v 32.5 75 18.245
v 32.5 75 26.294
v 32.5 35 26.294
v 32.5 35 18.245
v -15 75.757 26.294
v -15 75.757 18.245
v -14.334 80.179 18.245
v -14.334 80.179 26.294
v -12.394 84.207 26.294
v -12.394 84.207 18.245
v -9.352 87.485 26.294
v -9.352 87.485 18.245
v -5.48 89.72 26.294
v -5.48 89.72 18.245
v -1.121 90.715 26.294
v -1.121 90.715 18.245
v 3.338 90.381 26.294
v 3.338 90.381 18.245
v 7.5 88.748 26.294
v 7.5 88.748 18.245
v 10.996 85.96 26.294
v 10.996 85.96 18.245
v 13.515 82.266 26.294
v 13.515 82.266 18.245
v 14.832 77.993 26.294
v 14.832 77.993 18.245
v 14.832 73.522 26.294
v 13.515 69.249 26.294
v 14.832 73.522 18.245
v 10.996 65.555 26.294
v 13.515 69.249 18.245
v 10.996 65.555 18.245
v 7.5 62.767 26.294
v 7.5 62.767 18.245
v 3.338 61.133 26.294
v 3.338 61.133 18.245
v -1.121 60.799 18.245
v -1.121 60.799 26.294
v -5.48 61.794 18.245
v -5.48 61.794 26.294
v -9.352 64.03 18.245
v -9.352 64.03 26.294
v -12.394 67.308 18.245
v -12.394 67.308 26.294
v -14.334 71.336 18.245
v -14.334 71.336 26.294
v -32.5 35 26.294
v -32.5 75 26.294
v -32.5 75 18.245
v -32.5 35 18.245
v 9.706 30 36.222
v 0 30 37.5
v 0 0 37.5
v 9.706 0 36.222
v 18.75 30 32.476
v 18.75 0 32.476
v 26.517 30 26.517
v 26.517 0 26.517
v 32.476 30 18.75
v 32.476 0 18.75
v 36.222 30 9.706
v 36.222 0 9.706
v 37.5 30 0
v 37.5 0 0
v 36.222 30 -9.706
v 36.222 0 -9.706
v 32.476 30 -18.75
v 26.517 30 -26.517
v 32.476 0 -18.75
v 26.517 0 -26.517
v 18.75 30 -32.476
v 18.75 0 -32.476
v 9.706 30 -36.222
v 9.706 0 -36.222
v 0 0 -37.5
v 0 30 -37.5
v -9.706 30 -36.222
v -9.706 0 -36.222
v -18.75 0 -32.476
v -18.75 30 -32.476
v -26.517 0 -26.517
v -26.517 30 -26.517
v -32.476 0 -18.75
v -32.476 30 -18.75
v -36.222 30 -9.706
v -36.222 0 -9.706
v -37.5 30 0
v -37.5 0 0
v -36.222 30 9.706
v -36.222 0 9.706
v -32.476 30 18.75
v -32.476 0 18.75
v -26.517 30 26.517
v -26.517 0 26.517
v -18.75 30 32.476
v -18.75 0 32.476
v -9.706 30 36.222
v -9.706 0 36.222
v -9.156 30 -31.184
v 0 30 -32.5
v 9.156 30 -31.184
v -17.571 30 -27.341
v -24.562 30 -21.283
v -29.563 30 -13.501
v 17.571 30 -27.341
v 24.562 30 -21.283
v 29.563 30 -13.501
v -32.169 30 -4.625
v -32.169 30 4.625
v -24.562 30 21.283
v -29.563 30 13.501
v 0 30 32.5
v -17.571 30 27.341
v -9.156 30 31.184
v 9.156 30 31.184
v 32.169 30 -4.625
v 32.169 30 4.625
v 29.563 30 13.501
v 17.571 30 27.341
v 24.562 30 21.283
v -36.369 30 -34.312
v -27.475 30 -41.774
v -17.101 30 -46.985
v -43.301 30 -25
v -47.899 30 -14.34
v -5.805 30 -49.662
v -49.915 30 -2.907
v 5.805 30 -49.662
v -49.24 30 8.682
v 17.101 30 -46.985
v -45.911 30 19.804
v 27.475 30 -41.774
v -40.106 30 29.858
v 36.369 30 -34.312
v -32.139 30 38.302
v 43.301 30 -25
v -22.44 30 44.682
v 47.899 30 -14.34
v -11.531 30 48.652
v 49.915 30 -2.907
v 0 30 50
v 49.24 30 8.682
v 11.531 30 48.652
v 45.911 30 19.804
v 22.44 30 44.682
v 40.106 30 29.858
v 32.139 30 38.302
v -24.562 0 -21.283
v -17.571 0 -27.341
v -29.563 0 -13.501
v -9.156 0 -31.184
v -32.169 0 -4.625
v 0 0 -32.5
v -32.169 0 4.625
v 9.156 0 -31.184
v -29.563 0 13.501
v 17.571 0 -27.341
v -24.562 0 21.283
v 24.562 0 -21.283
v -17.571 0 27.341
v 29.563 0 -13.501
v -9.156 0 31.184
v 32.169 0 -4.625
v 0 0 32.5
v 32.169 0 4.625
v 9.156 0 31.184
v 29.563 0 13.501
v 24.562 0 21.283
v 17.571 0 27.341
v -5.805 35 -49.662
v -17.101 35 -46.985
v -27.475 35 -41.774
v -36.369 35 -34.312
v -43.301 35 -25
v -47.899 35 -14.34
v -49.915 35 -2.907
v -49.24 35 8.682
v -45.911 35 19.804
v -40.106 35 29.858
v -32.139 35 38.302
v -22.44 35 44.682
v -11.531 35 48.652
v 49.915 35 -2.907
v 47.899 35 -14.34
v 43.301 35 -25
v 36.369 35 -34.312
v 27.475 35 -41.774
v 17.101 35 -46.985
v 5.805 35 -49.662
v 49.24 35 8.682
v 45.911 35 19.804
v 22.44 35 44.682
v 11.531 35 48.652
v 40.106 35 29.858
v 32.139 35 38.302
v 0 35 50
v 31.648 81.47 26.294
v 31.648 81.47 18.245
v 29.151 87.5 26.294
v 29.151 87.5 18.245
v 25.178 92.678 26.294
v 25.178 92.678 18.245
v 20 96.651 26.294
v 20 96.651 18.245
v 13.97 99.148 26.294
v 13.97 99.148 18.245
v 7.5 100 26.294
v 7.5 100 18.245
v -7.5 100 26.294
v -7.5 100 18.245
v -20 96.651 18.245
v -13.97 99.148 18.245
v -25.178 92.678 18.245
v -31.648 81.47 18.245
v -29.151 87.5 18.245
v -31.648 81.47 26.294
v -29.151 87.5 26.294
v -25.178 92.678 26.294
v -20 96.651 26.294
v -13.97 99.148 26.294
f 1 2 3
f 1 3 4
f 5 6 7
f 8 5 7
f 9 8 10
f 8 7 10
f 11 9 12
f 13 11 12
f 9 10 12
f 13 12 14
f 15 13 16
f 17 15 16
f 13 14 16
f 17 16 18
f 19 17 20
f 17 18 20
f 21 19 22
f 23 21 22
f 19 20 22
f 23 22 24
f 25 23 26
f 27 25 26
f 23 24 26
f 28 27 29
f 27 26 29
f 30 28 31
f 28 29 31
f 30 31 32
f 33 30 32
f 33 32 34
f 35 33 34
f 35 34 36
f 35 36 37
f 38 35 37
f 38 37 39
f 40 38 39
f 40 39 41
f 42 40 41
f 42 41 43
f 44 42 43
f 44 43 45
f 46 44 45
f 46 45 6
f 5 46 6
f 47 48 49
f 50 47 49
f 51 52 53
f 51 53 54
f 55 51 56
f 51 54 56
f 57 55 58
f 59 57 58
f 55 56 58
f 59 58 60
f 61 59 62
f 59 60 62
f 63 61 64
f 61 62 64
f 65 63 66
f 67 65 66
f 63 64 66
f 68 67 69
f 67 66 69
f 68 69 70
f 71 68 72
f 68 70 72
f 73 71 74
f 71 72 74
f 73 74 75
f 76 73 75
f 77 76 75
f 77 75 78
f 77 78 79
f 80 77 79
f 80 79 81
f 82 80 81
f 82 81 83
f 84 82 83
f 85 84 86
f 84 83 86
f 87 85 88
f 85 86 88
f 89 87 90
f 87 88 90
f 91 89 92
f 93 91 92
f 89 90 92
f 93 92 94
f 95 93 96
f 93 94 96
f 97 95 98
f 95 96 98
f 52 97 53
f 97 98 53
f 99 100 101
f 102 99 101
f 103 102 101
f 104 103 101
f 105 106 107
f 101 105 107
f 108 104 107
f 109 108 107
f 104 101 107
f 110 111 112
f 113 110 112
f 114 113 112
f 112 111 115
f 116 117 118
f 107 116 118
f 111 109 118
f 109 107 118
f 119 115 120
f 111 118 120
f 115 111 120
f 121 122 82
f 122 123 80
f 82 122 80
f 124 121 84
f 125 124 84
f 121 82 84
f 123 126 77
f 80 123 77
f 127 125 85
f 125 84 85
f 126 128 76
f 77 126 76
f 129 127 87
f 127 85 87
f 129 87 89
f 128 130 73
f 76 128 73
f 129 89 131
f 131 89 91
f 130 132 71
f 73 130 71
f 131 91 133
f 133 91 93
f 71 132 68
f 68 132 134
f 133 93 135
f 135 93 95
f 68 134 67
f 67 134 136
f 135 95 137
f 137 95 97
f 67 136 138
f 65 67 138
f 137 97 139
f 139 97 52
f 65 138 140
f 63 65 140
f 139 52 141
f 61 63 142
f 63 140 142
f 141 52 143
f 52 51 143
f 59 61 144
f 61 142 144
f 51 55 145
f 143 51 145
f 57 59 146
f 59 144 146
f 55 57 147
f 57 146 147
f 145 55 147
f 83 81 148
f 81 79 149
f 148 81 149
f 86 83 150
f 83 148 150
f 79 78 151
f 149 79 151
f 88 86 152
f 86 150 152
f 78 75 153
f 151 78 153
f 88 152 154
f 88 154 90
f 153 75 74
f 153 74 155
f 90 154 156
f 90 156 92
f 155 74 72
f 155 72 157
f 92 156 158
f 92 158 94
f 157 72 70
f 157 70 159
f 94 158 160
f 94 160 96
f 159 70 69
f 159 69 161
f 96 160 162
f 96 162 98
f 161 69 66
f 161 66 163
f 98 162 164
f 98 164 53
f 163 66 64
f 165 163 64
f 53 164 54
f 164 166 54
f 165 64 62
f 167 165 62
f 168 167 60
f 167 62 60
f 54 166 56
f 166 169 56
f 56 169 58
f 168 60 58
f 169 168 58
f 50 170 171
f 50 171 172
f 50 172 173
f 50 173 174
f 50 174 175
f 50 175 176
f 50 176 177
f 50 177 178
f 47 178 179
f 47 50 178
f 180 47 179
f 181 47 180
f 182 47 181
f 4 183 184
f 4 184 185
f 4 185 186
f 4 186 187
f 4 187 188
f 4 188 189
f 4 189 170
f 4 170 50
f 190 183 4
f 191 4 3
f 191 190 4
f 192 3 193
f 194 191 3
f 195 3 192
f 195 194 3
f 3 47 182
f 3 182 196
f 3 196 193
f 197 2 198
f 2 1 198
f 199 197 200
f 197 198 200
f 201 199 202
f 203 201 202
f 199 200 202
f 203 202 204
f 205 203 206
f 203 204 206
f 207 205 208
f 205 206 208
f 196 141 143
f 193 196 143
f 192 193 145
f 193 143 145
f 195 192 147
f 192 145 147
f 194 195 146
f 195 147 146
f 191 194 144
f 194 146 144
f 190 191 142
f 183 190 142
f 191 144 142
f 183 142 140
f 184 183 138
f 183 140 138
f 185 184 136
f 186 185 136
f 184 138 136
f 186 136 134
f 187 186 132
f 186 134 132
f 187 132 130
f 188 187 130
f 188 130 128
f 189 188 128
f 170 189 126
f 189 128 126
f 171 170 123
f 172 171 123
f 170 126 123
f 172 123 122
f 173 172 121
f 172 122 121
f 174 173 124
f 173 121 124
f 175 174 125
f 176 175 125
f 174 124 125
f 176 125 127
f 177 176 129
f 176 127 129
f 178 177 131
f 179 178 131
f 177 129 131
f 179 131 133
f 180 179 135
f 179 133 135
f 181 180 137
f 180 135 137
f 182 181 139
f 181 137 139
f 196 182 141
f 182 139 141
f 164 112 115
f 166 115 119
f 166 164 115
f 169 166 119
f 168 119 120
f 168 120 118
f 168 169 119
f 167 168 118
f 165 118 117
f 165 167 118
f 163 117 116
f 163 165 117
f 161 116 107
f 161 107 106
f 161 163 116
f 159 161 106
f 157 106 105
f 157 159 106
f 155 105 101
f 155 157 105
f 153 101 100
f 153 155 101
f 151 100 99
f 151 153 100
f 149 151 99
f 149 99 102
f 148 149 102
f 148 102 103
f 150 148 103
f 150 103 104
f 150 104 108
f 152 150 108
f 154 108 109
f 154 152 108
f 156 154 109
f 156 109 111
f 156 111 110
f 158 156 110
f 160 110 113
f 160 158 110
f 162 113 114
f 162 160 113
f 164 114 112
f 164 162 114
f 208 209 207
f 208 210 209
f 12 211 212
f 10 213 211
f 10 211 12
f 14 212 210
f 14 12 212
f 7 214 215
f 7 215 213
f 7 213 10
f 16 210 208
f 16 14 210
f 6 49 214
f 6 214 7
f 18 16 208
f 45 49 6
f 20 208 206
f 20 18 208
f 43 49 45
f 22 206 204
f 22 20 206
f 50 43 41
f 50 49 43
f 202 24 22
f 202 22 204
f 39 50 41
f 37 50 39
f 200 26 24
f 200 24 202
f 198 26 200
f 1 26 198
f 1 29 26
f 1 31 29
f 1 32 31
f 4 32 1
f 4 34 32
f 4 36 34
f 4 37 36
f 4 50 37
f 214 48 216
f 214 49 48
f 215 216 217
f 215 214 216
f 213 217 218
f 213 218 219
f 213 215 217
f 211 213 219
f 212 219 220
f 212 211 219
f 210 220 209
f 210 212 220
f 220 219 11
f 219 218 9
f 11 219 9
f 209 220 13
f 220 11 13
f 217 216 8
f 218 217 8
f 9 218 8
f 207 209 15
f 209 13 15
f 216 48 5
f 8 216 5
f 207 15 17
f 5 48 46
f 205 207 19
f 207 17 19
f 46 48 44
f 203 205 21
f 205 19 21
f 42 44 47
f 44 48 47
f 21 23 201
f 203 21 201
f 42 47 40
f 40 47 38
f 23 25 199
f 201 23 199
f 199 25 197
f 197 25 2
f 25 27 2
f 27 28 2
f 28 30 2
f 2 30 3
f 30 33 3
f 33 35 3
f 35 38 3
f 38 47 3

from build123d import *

# Parameters (mm, degrees)
SKETCH3_R           = 37.5
SKETCH3_R_2         = 32.5
BOSS_EXTRUDE1_DEPTH = 30
SKETCH4_R           = 50
BOSS_EXTRUDE2_DEPTH = 5
SKETCH5_W           = 65
SKETCH5_H           = 8.049170271
BOSS_EXTRUDE3_DEPTH = 65
FILLET1_R           = 25
SKETCH6_R           = 15
CUT_EXTRUDE1_DEPTH  = 10


with BuildPart() as part:
    # Sketch3 → Boss-Extrude1 (new body)
    with BuildSketch(Plane(origin=(0, 0, 0), x_dir=(1, 0, 0), z_dir=(0, 1, 0))):
        with Locations(Location((0, 0, 0), (0, 0, 270))):
            Circle(SKETCH3_R)
        with Locations(Location((0, 0, 0), (0, 0, 270))):
            Circle(SKETCH3_R_2, mode=Mode.SUBTRACT)
    extrude(amount=BOSS_EXTRUDE1_DEPTH)

    # Sketch4 → Boss-Extrude2 (add)
    with BuildSketch(Plane(origin=(0, 30, 0), x_dir=(1, 0, 0), z_dir=(0, 1, 0))):
        with Locations(Location((0, 0, 0), (0, 0, 270))):
            Circle(SKETCH4_R)
    extrude(amount=BOSS_EXTRUDE2_DEPTH)

    # Sketch5 → Boss-Extrude3 (add)
    with BuildSketch(Plane(origin=(0, 35, 0), x_dir=(1, 0, 0), z_dir=(0, 1, 0))):
        with Locations((0, -22.269371084)):
            Rectangle(SKETCH5_W, SKETCH5_H)
    extrude(amount=BOSS_EXTRUDE3_DEPTH)

    # Fillet1
    fillet1_edges = [part.edges().sort_by_distance(p)[0] for p in [
        (-32.5, 100, 22.269371084),
        (32.5, 100, 22.269371084),
    ]]
    fillet(fillet1_edges, radius=FILLET1_R)

    # Sketch6 → Cut-Extrude1 (cut)
    with BuildSketch(Plane(origin=(0, 0, 18.244785948), x_dir=(-1, 0, 0), z_dir=(0, 0, -1))):
        with Locations((0, 75.757344868)):
            Circle(SKETCH6_R)
    extrude(amount=-CUT_EXTRUDE1_DEPTH, mode=Mode.SUBTRACT)


solid = part.part
